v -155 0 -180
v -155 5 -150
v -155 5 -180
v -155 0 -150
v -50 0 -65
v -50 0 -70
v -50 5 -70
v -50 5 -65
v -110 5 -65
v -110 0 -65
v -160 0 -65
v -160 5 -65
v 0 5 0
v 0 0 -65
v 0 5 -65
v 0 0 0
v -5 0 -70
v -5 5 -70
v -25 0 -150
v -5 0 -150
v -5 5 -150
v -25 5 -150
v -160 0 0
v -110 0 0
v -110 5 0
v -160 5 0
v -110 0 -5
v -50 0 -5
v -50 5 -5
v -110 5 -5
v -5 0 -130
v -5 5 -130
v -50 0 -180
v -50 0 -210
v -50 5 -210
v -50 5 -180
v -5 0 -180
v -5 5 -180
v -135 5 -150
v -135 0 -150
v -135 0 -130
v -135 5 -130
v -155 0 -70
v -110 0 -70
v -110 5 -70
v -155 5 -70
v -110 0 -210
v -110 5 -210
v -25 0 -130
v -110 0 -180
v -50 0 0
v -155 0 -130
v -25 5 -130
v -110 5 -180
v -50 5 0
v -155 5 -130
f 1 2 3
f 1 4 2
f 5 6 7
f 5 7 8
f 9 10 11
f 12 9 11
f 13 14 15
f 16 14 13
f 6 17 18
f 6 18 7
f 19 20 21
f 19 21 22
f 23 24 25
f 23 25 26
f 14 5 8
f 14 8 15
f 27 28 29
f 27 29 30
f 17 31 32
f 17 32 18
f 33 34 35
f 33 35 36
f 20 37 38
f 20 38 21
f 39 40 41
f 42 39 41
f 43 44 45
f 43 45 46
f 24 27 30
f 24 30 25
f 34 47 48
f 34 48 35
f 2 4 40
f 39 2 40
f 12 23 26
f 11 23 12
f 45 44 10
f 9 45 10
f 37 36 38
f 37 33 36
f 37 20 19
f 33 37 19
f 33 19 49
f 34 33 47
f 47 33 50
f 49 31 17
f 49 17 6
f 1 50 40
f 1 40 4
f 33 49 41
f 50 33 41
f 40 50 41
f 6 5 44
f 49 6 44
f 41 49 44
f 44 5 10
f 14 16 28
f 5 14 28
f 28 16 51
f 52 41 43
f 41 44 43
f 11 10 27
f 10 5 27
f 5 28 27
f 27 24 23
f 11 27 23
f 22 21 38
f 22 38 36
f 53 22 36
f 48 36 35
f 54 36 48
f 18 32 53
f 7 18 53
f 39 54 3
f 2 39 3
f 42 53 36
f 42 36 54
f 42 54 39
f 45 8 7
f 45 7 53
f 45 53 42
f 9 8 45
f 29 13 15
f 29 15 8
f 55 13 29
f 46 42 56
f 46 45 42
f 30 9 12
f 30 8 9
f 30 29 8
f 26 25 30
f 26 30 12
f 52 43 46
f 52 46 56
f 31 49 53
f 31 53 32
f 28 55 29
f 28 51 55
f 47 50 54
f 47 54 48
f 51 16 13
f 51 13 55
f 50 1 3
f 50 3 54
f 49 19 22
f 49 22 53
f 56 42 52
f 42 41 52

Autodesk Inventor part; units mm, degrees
ref_plane "YZ Plane" through (0, 0, 0) normal (1, 0, 0) x (0, 1, 0)
ref_plane "XZ Plane" through (0, 0, 0) normal (0, 1, 0) x (-1, 0, 0)
ref_plane "XY Plane" through (0, 0, 0) normal (0, 0, 1) x (1, 0, 0)
sketch "Sketch1" plane through (0, 0, 0) normal (0, 1, 0) x (-1, 0, 0)
  line L0 (155, -70) -> (155, -210)
  line L1 (155, -210) -> (5, -210)
  line L2 (5, -210) -> (5, -70)
  line L3 (50, -210) -> (110, -210)
  line L4 (5, -70) -> (155, -70)
  line L5 (5, -70) -> (55, -70)
  line L6 (155, -150) -> (135, -150)
  line L7 (135, -150) -> (135, -130)
  line L8 (135, -130) -> (155, -130)
  line L9 (155, -130) -> (155, -150)
  line L10 (5, -150) -> (25, -150)
  line L11 (25, -150) -> (25, -130)
  line L12 (25, -130) -> (5, -130)
  line L13 (5, -180) -> (155, -180) construction
  line L14 (50, -180) -> (110, -180)
  line L15 (110, -180) -> (110, -210)
  line L16 (110, -210) -> (50, -210)
  line L17 (50, -210) -> (50, -180)
  line L18 (110, -210) -> (50, -210)
  line L19 (155, -180) -> (110, -180)
  line L20 (50, -180) -> (5, -180)
  line L21 (135, -30) -> (155, -30)
  line L22 (160, -70) -> (0, -70)
  line L23 (0, -70) -> (0, 0)
  line L24 (0, 0) -> (160, 0)
  line L25 (160, 0) -> (160, -70)
  line L26 (80, -210) -> (80, 0) construction
  line L27 (0, -70) -> (50, -70)
  line L28 (50, -70) -> (50, -65)
  line L29 (50, -65) -> (0, -65)
  line L30 (0, -65) -> (0, -70)
  line L31 (155, -70) -> (105, -70)
  line L32 (160, -70) -> (110, -70)
  line L33 (110, -70) -> (110, -65)
  line L34 (110, -65) -> (160, -65)
  line L35 (160, -65) -> (160, -70)
  line L36 (110, 0) -> (50, 0)
  line L37 (50, 0) -> (50, -5)
  line L38 (50, -5) -> (110, -5)
  line L39 (110, -5) -> (110, 0)
  point P0 (5, -100)
  point P1 (5, -120)
  point P2 (160, -65)
  point P3 (155, 0)
  point P4 (135, 0)
  point P5 (0, -65)
  point P6 (50, -70)
  point P7 (110, -70)
  point P8 (50, 0)
  point P9 (50, -70)
  point P10 (110, -70)
  point P11 (155, -70)
  point P12 (5, -70)
  dimension "d10" = 20
  dimension "d11" = 20
  dimension "d18" = 150
  dimension "d19" = 160
  dimension "d20" = 80
  dimension "d21" = 45
  dimension "d22" = 45
  dimension "d23" = 50
  dimension "d24" = 5
  dimension "d25" = 5
  dimension "d26" = 30
  dimension "d27" = 110
  dimension "d28" = 70
  dimension "d29" = 210
  dimension "d30" = 20
extrude "Extrusion1" add sketch "Sketch1" along normal blind 5 contours L0 L8 L7 L6 L19 L14 L20 L2 L10 L11 L12 L4 | L4 L28 L29 L23 L24 L37 L38 L39 L25 L34 L33 | L15 L1 L17 L14
properties part number "HOOD_1" material "Acrylic"
